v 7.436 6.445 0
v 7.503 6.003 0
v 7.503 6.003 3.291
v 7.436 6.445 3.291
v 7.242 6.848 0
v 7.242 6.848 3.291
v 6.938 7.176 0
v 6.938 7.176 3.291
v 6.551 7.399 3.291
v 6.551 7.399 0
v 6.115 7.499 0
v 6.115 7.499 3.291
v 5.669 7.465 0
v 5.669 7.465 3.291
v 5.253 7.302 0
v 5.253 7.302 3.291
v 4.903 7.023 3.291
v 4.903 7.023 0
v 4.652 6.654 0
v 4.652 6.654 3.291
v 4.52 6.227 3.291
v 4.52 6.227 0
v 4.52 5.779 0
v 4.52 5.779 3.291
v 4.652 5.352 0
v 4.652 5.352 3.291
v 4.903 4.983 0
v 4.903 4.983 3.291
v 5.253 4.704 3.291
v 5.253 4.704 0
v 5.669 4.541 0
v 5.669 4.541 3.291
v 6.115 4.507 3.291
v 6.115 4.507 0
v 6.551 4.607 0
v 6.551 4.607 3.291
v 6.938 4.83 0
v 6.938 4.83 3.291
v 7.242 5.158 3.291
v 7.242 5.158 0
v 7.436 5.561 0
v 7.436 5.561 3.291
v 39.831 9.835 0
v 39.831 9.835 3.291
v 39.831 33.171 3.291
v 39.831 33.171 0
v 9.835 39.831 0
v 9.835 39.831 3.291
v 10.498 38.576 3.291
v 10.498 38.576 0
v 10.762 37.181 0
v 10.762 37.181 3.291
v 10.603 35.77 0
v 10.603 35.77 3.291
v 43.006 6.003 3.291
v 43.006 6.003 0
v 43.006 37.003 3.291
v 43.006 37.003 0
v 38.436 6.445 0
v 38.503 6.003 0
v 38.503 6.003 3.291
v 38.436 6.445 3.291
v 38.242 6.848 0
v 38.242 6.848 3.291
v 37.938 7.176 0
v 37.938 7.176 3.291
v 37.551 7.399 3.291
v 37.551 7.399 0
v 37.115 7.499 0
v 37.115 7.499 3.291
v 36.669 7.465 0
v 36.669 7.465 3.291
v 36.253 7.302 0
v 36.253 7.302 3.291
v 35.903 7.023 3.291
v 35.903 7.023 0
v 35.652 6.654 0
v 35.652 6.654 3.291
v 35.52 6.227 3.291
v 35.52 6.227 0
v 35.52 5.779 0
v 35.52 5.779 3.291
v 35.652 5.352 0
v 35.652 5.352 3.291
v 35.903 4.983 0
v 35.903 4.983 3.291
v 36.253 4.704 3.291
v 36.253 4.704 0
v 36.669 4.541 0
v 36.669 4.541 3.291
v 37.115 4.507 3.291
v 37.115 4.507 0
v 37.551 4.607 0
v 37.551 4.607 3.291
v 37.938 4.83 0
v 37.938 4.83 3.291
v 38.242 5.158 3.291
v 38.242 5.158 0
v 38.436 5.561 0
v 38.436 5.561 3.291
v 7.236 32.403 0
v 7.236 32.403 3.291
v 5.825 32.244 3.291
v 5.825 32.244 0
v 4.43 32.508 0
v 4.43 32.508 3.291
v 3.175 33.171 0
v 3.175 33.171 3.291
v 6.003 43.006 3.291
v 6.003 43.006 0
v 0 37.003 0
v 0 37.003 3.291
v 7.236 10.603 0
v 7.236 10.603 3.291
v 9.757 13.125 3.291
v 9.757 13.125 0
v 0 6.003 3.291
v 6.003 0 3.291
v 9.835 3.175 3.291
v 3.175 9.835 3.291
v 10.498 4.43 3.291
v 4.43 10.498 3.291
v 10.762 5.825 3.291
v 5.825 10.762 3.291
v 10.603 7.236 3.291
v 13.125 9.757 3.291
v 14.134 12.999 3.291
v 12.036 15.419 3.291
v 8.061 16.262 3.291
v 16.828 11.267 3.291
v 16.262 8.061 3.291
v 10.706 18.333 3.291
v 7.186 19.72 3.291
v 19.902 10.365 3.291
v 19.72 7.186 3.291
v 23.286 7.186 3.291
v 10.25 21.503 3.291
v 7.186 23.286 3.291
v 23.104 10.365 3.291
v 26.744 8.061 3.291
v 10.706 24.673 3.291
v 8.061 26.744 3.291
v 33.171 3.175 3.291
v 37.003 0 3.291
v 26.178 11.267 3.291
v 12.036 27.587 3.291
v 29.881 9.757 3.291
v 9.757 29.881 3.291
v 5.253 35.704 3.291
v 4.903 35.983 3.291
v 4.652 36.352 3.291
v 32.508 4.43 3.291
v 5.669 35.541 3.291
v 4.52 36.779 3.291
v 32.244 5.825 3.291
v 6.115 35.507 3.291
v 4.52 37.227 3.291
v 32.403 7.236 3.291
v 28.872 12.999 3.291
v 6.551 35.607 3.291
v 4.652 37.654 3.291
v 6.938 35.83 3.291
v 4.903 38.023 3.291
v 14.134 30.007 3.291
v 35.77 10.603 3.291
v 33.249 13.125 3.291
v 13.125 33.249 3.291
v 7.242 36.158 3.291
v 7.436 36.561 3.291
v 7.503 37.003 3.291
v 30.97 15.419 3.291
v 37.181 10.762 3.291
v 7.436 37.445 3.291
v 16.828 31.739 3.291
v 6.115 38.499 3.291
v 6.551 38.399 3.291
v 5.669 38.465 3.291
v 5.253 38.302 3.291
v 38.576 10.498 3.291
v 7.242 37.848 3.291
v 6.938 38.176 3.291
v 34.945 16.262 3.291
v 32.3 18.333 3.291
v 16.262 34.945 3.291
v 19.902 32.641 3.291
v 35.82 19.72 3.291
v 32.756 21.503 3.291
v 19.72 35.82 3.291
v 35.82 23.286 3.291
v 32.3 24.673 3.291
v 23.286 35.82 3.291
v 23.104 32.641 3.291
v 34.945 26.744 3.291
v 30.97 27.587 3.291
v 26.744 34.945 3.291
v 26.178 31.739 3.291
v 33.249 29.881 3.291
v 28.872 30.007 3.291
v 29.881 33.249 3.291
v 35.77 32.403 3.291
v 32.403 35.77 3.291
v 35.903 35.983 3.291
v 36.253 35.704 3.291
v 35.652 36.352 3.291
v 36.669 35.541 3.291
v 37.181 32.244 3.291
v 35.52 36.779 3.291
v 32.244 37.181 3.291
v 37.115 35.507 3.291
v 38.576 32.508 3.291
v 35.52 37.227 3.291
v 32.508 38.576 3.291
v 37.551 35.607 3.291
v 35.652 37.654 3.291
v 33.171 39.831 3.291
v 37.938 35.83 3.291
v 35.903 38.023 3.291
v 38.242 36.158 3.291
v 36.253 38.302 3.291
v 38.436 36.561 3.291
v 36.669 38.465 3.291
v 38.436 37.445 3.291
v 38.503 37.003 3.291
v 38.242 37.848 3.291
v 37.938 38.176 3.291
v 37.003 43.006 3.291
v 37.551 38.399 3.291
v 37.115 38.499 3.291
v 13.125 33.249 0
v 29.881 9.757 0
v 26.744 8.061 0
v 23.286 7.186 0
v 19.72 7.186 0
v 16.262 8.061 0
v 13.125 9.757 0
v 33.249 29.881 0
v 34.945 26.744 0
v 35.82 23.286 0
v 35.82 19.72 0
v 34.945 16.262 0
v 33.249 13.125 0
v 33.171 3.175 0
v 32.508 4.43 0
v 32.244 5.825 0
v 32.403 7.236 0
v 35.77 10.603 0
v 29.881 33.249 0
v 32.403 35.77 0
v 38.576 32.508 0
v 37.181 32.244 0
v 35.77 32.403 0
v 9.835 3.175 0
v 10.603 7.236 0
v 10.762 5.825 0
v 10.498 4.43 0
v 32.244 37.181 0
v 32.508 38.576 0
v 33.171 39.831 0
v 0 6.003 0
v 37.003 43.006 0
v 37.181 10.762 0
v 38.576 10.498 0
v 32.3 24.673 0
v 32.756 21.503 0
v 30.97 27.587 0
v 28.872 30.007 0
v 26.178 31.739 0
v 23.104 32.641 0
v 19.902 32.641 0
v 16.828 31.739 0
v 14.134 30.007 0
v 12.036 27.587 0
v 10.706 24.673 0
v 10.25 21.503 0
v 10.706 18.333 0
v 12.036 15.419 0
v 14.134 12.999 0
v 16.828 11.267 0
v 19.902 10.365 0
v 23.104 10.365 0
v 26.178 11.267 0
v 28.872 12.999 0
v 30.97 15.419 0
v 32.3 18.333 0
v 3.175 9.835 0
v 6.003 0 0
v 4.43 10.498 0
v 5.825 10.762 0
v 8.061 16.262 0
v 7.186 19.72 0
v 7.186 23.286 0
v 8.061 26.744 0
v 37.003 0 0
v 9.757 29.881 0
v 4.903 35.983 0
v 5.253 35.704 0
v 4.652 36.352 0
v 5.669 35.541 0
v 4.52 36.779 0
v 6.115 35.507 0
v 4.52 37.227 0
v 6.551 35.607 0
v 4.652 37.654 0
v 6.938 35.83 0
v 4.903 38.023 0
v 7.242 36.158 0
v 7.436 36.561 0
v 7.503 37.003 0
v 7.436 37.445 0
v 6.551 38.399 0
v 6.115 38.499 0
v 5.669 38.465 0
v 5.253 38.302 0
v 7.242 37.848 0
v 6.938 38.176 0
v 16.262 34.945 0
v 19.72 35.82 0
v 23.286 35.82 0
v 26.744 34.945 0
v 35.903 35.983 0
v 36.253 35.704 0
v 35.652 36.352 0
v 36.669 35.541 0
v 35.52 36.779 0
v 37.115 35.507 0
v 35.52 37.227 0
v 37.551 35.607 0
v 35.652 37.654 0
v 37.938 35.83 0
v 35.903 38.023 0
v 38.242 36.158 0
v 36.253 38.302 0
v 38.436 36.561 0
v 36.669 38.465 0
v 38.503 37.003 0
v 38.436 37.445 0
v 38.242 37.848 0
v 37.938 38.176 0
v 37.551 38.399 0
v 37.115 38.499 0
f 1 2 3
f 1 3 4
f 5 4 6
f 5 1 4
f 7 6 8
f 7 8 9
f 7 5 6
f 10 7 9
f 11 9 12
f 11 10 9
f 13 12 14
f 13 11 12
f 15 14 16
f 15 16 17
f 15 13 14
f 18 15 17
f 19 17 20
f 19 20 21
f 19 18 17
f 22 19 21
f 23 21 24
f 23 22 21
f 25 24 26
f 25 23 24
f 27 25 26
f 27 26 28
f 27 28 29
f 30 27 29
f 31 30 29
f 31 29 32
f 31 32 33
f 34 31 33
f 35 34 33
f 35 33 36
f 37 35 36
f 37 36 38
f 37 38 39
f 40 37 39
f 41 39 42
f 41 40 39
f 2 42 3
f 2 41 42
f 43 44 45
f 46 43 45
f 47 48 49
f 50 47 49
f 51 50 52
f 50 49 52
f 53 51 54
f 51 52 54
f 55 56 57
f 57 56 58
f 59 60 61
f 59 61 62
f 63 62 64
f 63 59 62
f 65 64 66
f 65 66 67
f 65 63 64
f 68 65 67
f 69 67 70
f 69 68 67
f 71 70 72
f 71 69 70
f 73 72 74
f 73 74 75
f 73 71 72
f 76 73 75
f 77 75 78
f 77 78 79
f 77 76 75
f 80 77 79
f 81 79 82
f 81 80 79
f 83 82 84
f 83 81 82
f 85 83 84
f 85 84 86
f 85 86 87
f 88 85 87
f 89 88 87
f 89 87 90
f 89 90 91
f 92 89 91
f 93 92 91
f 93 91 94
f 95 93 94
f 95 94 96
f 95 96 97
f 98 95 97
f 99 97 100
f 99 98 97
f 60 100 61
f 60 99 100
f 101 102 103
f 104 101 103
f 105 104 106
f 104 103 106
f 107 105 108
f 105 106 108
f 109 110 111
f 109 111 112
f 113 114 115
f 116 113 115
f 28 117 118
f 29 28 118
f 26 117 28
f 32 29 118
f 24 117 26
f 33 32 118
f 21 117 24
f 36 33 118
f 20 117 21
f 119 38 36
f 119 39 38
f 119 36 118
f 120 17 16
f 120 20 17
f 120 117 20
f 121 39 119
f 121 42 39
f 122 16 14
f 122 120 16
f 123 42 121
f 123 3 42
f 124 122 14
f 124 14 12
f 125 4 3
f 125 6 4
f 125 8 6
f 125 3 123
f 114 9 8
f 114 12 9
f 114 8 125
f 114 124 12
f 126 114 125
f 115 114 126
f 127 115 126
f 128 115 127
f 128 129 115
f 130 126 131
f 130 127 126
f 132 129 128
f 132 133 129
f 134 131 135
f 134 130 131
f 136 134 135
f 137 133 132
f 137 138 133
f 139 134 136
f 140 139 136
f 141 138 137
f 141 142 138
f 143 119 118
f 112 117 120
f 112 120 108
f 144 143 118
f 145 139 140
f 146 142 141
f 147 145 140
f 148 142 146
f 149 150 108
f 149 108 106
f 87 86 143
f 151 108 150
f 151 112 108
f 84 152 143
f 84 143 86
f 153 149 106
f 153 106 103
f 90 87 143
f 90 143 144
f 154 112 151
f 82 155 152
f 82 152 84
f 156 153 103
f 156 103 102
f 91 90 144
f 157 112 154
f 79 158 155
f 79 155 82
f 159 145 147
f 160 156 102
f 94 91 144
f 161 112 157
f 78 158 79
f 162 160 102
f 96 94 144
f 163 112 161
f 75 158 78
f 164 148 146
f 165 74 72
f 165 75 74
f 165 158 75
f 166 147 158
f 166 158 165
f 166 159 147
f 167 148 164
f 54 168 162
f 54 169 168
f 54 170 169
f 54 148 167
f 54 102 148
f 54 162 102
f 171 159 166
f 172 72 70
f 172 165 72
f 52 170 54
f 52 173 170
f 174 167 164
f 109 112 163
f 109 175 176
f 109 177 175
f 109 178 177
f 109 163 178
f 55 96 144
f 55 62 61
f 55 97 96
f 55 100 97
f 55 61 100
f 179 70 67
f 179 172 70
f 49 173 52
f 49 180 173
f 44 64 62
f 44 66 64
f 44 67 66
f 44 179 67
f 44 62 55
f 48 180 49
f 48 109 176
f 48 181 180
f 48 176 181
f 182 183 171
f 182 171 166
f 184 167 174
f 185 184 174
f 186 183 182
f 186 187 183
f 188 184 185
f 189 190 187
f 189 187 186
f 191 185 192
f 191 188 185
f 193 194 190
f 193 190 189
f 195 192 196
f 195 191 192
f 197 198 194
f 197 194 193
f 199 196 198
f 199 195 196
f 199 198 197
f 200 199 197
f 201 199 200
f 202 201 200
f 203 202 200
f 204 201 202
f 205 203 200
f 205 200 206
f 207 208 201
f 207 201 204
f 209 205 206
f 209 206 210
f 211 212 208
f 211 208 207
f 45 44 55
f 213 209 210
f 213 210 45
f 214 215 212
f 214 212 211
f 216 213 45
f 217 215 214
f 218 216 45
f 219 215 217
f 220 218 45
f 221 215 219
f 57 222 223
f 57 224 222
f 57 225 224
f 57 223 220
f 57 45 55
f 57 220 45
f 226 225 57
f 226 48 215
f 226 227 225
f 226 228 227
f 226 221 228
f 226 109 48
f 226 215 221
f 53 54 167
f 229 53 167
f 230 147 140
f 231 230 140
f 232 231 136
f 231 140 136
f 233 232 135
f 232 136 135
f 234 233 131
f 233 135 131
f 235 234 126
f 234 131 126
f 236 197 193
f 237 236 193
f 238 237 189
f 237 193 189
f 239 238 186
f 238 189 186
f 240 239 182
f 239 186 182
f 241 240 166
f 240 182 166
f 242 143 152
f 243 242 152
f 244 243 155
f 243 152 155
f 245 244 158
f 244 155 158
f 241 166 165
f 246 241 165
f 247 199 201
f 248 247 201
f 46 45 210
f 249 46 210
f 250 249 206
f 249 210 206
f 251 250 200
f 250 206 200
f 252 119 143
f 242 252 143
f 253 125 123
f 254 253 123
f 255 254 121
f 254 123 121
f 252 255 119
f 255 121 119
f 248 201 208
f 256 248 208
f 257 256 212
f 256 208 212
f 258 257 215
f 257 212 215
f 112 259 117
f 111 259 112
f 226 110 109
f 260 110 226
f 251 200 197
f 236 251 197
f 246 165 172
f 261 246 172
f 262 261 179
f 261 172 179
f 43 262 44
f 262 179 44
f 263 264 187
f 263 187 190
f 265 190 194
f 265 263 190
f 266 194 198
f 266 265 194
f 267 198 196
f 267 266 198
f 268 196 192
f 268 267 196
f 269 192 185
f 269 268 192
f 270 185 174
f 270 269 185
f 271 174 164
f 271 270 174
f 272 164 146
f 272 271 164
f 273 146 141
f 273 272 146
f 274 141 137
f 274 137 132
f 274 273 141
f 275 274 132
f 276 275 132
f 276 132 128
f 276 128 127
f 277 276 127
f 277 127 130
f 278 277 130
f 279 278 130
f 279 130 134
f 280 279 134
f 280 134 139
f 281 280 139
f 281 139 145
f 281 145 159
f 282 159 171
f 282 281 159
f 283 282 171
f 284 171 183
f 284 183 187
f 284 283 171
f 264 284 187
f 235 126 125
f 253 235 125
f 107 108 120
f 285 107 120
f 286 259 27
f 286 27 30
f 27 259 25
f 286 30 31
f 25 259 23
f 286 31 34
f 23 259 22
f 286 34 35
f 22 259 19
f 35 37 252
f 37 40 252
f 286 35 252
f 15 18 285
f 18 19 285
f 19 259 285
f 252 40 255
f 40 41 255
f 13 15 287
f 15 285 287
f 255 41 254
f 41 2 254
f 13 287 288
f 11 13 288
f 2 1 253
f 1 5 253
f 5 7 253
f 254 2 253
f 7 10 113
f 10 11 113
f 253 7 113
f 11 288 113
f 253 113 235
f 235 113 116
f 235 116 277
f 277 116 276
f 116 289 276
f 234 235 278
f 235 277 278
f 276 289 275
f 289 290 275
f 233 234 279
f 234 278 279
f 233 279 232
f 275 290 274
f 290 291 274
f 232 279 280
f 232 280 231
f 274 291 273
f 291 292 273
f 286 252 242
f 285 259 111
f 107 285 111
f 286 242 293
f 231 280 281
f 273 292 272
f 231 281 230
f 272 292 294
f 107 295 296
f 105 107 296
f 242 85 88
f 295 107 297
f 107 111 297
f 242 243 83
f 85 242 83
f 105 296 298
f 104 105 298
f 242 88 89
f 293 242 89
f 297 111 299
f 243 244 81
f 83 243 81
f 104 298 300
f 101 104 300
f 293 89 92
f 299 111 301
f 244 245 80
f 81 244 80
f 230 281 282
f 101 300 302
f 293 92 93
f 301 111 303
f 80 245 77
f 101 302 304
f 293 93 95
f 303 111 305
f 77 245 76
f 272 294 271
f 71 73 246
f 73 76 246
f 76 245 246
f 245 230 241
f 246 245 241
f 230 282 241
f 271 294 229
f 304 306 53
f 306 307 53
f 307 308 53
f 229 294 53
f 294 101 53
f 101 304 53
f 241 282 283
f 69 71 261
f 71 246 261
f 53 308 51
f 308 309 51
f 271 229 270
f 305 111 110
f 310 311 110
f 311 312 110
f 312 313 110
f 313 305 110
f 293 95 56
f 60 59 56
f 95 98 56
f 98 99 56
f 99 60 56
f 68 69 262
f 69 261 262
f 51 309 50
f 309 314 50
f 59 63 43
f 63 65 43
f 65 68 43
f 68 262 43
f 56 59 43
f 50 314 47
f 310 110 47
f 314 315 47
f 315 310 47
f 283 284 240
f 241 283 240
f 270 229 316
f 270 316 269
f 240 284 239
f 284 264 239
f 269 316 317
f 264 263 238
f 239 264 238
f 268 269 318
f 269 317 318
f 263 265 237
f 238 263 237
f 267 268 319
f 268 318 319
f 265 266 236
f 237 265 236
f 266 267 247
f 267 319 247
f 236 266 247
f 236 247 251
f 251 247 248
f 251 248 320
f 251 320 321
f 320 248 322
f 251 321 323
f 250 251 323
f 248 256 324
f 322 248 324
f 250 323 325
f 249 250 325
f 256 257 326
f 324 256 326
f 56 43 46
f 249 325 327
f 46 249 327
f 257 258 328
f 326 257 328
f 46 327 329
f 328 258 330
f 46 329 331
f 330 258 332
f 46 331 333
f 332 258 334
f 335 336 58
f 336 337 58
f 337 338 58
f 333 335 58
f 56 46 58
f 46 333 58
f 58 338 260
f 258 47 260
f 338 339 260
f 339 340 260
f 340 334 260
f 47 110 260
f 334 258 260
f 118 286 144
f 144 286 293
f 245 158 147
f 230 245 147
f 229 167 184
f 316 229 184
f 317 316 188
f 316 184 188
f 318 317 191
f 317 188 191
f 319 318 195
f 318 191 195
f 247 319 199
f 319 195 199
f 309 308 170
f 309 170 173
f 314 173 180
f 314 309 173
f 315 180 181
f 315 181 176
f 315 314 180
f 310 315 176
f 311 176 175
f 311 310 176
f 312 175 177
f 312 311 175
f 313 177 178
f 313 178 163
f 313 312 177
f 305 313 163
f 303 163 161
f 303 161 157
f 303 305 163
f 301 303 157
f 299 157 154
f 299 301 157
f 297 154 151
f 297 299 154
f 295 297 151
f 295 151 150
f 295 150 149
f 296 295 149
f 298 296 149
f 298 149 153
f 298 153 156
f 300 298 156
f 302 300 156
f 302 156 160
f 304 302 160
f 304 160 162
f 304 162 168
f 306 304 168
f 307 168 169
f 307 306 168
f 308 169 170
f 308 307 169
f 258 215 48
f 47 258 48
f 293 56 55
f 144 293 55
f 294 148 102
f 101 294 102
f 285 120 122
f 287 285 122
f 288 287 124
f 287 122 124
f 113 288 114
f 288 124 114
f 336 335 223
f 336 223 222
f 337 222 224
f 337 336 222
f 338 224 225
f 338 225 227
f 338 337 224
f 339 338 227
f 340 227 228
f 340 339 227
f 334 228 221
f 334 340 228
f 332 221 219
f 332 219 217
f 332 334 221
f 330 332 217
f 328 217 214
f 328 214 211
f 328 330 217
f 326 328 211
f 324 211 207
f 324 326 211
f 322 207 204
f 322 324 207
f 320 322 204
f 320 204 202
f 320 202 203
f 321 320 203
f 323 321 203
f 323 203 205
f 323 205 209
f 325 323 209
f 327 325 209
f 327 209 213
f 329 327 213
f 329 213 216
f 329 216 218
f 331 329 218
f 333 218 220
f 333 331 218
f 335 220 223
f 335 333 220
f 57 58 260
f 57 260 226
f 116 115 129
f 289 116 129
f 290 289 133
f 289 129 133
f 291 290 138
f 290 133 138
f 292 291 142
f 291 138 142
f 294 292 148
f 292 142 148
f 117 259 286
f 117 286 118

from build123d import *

# Parameters (mm, degrees)
F0_W            = 43.0059846
F0_H            = 43.0059846
F0_R            = 1.5
F0_R_2          = 11.2530001
F1_DEPTH        = 3.29057
F2_SIZE         = 6.0030106
F4_DEPTH        = 3.29057
F4_COPIES_COUNT = 4


# Not quite as in the source:
# - a pattern or mirror of a feature is missing from the dataset's text; its kind, count and spacing are read off the source's solid


with BuildPart() as f1:
    # F0 (on Top) → F1 (new body)
    with BuildSketch(Plane.XY):
        with Locations((21.5029923, 21.5029923)):
            Rectangle(F0_W, F0_H)
        with Locations((6.0029979, 6.0029979)):
            Circle(F0_R, mode=Mode.SUBTRACT)
        with Locations((21.5029923, 21.5029923)):
            Circle(F0_R_2, mode=Mode.SUBTRACT)
        with Locations((37.0029867, 6.0029979)):
            Circle(F0_R, mode=Mode.SUBTRACT)
        with Locations((6.0029979, 37.0029867)):
            Circle(F0_R, mode=Mode.SUBTRACT)
        with Locations((37.0029867, 37.0029867)):
            Circle(F0_R, mode=Mode.SUBTRACT)
    extrude(amount=F1_DEPTH)

    # F2
    f2_edges = [f1.edges().sort_by_distance(p)[0] for p in [
        (0, 0, 1.645285),
        (0, 43.005985, 1.645285),
        (43.005985, 0, 1.645285),
        (43.005985, 43.005985, 1.645285),
    ]]
    chamfer(f2_edges, length=F2_SIZE)

    # F3 (on face) → F4 (cut, through all)
    with BuildSketch(Plane.XY.offset(3.29057)):
        with BuildLine():
            ThreePointArc((7.2356236023, 32.4027649523), (5.1176370603, 32.3235056996), (3.175, 33.171037571))
            Line((3.175, 33.171037571), (3.175, 9.834947029))
            ThreePointArc((3.175, 9.834947029), (5.1176370603, 10.6824789004), (7.2356236023, 10.6032196477))
            Line((7.2356236023, 10.6032196477), (9.7569670059, 13.1245630513))
            ThreePointArc((9.7569670059, 13.1245630513), (7.0749922, 21.5029923), (9.7569670059, 29.8814215487))
            Line((9.7569670059, 29.8814215487), (7.2356236023, 32.4027649523))
        make_face()
    f4 = extrude(amount=-F4_DEPTH, mode=Mode.SUBTRACT)

    # F4_copies: F4 ×4 about axis
    f4_copies_axis = Axis((21.502992, 21.502992, 0), (0, 0, 1))
    for i in range(1, F4_COPIES_COUNT):
        add(f4.rotate(f4_copies_axis, i * 360 / F4_COPIES_COUNT), mode=Mode.SUBTRACT)


solid = f1.part
